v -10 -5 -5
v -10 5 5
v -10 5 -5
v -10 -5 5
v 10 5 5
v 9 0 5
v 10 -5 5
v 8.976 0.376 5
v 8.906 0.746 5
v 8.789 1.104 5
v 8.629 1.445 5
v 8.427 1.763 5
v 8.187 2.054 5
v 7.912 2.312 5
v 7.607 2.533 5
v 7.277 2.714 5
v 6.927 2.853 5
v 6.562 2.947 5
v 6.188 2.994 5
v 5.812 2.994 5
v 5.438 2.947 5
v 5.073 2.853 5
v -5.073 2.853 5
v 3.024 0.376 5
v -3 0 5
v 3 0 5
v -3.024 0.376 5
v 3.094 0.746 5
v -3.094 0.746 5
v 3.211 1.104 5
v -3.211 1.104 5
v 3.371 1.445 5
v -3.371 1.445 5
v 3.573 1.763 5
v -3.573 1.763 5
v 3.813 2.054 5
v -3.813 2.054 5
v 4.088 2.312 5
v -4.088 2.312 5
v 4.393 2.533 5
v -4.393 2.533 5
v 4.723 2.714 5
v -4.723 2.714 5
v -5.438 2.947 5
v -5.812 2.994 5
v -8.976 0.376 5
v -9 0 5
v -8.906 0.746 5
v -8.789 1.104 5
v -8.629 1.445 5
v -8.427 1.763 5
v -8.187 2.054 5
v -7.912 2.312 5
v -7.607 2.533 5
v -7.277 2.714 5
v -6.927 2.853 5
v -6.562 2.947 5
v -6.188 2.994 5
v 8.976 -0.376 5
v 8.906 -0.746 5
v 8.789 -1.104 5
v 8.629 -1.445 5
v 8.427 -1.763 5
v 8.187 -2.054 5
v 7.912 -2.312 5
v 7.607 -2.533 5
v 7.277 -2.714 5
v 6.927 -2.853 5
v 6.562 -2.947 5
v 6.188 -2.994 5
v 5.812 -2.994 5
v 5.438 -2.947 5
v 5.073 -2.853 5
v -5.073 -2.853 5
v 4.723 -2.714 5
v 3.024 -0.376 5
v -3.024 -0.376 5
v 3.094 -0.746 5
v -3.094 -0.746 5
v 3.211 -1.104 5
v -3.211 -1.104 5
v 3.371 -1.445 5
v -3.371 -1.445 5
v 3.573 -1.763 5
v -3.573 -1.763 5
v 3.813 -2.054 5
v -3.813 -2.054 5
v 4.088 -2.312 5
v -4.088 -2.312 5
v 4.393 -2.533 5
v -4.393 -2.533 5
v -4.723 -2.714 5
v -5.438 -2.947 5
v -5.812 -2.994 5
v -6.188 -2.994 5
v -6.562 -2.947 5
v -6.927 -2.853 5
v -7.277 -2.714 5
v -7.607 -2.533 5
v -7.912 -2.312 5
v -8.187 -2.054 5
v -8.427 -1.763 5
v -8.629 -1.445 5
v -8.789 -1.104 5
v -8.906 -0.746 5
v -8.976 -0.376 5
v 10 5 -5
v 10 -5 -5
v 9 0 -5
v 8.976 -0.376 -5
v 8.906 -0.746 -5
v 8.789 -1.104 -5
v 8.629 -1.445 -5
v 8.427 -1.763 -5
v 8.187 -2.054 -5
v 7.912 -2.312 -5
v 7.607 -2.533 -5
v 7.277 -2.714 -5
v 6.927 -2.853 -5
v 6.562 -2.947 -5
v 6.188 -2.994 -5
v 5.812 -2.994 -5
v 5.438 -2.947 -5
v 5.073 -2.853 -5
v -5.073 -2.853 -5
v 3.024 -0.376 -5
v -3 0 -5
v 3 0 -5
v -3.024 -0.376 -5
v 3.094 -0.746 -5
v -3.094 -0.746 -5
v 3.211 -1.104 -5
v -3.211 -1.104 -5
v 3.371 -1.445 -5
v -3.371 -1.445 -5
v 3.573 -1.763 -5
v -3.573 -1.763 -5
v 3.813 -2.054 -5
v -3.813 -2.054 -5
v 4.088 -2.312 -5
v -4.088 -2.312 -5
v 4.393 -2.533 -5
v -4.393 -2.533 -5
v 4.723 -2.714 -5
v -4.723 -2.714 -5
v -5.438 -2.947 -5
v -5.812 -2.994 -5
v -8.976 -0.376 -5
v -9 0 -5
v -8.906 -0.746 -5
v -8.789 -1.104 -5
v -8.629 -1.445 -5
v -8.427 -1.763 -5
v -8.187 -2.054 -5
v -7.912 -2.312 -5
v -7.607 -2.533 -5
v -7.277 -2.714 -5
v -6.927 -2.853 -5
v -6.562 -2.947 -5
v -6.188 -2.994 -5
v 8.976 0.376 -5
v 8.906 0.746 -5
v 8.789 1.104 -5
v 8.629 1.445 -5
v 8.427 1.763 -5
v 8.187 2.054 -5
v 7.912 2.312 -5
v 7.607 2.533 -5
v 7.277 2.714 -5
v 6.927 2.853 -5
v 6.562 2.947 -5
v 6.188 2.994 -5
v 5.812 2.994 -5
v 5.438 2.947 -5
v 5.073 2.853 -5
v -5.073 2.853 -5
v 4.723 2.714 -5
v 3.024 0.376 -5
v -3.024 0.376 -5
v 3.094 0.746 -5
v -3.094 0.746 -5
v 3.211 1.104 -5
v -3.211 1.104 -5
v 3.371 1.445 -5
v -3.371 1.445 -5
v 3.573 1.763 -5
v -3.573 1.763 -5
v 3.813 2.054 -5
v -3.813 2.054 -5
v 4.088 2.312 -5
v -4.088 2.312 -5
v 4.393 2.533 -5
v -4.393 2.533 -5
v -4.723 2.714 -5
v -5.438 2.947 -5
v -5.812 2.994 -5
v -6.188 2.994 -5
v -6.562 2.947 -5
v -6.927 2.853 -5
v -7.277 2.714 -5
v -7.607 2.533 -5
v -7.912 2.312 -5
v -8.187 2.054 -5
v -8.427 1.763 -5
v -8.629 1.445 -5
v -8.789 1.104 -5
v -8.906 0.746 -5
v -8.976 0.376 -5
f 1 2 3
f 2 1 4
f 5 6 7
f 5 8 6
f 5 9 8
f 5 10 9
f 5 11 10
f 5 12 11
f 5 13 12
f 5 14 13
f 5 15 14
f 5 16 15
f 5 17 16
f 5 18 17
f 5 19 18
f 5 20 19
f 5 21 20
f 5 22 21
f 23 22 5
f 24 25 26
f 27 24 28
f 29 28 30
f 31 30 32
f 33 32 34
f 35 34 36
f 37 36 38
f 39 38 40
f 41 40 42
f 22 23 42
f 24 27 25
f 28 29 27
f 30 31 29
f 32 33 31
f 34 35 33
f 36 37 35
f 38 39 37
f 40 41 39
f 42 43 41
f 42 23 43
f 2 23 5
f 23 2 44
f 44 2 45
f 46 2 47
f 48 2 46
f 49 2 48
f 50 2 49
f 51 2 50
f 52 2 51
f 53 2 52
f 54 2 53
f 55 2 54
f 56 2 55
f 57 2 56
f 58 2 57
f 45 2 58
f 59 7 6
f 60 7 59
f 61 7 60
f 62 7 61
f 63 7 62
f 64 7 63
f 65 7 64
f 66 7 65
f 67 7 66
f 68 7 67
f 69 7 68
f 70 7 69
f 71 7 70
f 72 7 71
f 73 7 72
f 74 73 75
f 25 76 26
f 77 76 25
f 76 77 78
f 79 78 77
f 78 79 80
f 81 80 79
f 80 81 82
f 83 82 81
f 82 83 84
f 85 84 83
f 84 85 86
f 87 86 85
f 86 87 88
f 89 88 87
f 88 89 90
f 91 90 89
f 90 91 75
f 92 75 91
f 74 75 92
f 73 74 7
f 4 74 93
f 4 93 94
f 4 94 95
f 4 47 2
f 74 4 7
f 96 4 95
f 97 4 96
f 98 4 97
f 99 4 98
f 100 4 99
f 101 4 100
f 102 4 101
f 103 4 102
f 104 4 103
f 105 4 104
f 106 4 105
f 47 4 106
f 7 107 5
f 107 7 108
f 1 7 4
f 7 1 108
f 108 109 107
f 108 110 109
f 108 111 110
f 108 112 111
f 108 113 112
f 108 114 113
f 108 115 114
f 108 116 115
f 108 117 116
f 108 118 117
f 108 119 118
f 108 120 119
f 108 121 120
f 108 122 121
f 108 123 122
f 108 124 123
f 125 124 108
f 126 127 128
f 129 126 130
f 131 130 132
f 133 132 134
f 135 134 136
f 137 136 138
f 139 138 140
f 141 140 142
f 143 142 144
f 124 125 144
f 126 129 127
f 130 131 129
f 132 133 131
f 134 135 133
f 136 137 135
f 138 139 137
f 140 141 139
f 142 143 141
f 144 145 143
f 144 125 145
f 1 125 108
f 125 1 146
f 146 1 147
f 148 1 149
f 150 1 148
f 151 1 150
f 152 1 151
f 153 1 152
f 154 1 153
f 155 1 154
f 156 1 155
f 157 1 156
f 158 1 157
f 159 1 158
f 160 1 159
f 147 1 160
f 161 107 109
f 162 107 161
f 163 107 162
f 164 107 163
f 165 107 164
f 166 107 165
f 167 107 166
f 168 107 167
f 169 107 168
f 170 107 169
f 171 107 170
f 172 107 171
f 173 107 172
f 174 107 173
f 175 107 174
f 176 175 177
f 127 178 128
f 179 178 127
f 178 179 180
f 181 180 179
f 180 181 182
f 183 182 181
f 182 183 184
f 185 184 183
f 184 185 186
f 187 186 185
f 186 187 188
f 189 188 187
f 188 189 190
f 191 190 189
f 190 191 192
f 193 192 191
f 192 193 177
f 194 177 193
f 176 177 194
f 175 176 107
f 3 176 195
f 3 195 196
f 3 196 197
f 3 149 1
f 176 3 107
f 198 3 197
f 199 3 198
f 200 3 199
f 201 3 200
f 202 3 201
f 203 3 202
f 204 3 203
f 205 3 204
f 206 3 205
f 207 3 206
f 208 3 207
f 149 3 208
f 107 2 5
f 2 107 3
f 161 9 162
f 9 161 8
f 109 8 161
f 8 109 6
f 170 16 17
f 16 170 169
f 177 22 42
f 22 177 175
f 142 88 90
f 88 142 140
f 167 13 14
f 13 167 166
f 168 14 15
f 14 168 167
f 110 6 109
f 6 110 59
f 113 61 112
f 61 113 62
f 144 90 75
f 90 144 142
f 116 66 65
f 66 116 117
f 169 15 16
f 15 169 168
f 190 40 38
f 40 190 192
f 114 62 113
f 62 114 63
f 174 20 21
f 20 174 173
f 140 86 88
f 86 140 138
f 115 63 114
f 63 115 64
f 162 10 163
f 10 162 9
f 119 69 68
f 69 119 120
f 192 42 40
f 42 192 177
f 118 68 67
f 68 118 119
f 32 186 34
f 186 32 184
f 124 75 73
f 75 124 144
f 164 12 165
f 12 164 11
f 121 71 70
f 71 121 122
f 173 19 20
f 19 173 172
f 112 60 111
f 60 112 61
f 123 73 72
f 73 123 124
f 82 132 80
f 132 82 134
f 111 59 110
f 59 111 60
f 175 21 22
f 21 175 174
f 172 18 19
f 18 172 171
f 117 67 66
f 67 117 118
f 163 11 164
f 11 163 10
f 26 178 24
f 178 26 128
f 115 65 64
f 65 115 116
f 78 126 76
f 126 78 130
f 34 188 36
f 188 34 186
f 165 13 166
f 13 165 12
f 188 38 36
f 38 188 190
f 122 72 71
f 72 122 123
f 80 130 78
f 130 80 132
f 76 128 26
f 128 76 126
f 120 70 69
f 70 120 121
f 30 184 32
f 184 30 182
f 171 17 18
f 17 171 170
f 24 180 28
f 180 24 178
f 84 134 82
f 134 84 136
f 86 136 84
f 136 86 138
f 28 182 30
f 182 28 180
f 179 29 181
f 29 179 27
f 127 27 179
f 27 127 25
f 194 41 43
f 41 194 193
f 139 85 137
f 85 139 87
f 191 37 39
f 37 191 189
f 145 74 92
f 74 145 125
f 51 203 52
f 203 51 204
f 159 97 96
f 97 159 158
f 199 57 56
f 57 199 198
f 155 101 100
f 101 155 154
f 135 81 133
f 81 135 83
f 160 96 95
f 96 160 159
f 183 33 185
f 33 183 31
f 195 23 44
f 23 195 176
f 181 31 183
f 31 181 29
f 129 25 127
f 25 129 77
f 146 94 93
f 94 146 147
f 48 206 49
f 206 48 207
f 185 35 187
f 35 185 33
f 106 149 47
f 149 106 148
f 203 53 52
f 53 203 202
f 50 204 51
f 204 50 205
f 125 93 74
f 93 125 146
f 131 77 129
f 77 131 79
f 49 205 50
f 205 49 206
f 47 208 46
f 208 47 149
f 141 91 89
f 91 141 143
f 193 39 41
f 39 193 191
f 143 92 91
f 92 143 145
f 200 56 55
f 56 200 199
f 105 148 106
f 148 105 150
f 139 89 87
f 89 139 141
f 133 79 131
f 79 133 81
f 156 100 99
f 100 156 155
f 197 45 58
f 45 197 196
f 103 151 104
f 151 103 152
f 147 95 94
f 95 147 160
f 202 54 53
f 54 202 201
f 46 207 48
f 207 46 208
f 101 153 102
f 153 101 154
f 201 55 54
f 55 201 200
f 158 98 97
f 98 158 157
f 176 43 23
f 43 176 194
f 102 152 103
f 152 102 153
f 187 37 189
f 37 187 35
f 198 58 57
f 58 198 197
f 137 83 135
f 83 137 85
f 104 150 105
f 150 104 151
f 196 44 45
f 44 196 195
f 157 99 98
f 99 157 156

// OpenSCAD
$fn=50; 

difference(){
    hull(){
        cube([20,10,10], center=true); 
    }
    translate([6,0,0]) cylinder(r=3,h=20, center=true);
    translate([-6,0,0]) cylinder(r=3,h=20, center=true); 
}
